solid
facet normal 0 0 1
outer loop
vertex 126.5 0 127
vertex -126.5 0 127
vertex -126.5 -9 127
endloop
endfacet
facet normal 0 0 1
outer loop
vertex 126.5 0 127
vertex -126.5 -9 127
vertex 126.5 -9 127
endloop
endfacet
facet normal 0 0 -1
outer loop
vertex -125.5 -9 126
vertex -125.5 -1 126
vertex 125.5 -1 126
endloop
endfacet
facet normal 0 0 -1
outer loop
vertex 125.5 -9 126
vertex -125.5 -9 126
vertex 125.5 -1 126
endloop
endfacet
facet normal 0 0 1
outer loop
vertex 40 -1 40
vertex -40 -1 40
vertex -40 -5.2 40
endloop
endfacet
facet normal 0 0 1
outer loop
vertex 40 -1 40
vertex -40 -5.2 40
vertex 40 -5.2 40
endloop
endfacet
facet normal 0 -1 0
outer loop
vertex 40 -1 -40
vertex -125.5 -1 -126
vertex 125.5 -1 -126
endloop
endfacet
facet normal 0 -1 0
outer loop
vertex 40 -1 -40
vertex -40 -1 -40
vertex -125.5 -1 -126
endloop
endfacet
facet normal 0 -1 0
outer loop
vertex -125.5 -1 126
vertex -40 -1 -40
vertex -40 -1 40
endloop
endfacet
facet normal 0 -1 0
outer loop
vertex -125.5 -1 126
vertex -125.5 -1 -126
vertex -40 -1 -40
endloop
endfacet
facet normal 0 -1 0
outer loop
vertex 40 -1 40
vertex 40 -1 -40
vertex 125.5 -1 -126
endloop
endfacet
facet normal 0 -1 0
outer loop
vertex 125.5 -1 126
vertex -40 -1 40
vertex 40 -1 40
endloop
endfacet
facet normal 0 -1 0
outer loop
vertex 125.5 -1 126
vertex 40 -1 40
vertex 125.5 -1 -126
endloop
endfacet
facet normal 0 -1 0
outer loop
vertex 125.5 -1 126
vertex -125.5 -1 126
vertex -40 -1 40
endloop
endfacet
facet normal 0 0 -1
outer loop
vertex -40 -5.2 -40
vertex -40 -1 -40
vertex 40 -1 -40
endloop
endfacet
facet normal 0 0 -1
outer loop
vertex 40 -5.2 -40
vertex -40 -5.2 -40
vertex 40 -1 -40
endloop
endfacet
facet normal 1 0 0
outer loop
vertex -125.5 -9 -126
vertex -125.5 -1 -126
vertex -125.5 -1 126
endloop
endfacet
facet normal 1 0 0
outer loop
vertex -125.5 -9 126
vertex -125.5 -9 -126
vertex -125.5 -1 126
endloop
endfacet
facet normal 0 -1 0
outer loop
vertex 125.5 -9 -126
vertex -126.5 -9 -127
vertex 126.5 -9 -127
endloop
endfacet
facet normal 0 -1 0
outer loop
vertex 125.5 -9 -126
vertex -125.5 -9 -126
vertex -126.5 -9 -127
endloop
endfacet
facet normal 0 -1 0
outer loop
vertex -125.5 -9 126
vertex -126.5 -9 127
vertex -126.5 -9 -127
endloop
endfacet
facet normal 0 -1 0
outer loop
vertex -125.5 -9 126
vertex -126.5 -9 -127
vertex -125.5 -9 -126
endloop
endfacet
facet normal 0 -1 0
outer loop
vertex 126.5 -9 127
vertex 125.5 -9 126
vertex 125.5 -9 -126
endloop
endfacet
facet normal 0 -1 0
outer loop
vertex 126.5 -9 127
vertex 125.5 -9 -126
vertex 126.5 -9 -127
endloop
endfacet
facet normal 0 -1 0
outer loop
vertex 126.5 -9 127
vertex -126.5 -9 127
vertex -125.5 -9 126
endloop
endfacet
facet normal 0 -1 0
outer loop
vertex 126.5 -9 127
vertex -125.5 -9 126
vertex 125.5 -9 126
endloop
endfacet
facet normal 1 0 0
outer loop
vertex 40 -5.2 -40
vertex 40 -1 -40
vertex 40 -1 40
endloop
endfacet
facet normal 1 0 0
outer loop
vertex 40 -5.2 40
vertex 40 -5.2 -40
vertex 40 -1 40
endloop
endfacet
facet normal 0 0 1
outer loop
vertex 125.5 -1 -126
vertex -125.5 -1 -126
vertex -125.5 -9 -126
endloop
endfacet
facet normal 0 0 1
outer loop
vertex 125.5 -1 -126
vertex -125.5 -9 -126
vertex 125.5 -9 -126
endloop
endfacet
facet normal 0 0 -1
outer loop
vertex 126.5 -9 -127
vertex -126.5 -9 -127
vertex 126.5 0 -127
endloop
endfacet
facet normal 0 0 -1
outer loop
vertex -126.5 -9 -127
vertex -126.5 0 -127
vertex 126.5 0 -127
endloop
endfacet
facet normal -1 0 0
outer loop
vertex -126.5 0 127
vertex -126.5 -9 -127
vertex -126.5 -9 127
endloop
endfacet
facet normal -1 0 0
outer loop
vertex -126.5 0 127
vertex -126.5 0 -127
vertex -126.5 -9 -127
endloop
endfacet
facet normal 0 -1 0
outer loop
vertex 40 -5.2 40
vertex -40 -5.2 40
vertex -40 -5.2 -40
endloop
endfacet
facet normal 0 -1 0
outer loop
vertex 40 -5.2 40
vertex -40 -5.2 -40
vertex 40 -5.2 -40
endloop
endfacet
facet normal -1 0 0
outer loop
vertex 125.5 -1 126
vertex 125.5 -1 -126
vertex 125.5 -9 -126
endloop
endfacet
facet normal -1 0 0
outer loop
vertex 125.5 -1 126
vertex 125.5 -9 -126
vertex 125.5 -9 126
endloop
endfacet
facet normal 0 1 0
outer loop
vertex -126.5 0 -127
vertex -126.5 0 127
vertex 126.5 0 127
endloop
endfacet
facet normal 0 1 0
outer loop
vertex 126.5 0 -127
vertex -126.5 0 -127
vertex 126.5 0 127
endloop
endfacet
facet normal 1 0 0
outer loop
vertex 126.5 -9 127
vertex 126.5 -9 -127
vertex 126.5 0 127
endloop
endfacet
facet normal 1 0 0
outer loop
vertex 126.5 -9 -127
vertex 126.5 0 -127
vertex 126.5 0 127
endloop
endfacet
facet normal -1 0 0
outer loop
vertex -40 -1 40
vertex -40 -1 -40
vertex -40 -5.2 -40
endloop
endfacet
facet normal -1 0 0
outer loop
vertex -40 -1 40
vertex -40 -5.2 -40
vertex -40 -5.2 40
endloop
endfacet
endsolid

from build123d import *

# Parameters (mm, degrees)
F0_W     = 253
F0_H     = 254
F1_DEPTH = 1
F2_W     = 253
F2_H     = 254
F2_W_2   = 251
F2_H_2   = 252
F3_DEPTH = 8
F4_W     = 80
F4_H     = 80
F5_DEPTH = 4.2


with BuildPart() as f1:
    # F0 (on Front) → F1 (new body)
    with BuildSketch(Plane.XZ):
        Rectangle(F0_W, F0_H)
    extrude(amount=F1_DEPTH)

    # F2 (on face) → F3 (join)
    with BuildSketch(Plane.XZ.offset(1)):
        Rectangle(F2_W, F2_H)
        Rectangle(F2_W_2, F2_H_2, mode=Mode.SUBTRACT)
    extrude(amount=F3_DEPTH)

    # F4 (on face) → F5 (join)
    with BuildSketch(Plane.XZ.offset(1)):
        Rectangle(F4_W, F4_H)
    extrude(amount=F5_DEPTH)


solid = f1.part
